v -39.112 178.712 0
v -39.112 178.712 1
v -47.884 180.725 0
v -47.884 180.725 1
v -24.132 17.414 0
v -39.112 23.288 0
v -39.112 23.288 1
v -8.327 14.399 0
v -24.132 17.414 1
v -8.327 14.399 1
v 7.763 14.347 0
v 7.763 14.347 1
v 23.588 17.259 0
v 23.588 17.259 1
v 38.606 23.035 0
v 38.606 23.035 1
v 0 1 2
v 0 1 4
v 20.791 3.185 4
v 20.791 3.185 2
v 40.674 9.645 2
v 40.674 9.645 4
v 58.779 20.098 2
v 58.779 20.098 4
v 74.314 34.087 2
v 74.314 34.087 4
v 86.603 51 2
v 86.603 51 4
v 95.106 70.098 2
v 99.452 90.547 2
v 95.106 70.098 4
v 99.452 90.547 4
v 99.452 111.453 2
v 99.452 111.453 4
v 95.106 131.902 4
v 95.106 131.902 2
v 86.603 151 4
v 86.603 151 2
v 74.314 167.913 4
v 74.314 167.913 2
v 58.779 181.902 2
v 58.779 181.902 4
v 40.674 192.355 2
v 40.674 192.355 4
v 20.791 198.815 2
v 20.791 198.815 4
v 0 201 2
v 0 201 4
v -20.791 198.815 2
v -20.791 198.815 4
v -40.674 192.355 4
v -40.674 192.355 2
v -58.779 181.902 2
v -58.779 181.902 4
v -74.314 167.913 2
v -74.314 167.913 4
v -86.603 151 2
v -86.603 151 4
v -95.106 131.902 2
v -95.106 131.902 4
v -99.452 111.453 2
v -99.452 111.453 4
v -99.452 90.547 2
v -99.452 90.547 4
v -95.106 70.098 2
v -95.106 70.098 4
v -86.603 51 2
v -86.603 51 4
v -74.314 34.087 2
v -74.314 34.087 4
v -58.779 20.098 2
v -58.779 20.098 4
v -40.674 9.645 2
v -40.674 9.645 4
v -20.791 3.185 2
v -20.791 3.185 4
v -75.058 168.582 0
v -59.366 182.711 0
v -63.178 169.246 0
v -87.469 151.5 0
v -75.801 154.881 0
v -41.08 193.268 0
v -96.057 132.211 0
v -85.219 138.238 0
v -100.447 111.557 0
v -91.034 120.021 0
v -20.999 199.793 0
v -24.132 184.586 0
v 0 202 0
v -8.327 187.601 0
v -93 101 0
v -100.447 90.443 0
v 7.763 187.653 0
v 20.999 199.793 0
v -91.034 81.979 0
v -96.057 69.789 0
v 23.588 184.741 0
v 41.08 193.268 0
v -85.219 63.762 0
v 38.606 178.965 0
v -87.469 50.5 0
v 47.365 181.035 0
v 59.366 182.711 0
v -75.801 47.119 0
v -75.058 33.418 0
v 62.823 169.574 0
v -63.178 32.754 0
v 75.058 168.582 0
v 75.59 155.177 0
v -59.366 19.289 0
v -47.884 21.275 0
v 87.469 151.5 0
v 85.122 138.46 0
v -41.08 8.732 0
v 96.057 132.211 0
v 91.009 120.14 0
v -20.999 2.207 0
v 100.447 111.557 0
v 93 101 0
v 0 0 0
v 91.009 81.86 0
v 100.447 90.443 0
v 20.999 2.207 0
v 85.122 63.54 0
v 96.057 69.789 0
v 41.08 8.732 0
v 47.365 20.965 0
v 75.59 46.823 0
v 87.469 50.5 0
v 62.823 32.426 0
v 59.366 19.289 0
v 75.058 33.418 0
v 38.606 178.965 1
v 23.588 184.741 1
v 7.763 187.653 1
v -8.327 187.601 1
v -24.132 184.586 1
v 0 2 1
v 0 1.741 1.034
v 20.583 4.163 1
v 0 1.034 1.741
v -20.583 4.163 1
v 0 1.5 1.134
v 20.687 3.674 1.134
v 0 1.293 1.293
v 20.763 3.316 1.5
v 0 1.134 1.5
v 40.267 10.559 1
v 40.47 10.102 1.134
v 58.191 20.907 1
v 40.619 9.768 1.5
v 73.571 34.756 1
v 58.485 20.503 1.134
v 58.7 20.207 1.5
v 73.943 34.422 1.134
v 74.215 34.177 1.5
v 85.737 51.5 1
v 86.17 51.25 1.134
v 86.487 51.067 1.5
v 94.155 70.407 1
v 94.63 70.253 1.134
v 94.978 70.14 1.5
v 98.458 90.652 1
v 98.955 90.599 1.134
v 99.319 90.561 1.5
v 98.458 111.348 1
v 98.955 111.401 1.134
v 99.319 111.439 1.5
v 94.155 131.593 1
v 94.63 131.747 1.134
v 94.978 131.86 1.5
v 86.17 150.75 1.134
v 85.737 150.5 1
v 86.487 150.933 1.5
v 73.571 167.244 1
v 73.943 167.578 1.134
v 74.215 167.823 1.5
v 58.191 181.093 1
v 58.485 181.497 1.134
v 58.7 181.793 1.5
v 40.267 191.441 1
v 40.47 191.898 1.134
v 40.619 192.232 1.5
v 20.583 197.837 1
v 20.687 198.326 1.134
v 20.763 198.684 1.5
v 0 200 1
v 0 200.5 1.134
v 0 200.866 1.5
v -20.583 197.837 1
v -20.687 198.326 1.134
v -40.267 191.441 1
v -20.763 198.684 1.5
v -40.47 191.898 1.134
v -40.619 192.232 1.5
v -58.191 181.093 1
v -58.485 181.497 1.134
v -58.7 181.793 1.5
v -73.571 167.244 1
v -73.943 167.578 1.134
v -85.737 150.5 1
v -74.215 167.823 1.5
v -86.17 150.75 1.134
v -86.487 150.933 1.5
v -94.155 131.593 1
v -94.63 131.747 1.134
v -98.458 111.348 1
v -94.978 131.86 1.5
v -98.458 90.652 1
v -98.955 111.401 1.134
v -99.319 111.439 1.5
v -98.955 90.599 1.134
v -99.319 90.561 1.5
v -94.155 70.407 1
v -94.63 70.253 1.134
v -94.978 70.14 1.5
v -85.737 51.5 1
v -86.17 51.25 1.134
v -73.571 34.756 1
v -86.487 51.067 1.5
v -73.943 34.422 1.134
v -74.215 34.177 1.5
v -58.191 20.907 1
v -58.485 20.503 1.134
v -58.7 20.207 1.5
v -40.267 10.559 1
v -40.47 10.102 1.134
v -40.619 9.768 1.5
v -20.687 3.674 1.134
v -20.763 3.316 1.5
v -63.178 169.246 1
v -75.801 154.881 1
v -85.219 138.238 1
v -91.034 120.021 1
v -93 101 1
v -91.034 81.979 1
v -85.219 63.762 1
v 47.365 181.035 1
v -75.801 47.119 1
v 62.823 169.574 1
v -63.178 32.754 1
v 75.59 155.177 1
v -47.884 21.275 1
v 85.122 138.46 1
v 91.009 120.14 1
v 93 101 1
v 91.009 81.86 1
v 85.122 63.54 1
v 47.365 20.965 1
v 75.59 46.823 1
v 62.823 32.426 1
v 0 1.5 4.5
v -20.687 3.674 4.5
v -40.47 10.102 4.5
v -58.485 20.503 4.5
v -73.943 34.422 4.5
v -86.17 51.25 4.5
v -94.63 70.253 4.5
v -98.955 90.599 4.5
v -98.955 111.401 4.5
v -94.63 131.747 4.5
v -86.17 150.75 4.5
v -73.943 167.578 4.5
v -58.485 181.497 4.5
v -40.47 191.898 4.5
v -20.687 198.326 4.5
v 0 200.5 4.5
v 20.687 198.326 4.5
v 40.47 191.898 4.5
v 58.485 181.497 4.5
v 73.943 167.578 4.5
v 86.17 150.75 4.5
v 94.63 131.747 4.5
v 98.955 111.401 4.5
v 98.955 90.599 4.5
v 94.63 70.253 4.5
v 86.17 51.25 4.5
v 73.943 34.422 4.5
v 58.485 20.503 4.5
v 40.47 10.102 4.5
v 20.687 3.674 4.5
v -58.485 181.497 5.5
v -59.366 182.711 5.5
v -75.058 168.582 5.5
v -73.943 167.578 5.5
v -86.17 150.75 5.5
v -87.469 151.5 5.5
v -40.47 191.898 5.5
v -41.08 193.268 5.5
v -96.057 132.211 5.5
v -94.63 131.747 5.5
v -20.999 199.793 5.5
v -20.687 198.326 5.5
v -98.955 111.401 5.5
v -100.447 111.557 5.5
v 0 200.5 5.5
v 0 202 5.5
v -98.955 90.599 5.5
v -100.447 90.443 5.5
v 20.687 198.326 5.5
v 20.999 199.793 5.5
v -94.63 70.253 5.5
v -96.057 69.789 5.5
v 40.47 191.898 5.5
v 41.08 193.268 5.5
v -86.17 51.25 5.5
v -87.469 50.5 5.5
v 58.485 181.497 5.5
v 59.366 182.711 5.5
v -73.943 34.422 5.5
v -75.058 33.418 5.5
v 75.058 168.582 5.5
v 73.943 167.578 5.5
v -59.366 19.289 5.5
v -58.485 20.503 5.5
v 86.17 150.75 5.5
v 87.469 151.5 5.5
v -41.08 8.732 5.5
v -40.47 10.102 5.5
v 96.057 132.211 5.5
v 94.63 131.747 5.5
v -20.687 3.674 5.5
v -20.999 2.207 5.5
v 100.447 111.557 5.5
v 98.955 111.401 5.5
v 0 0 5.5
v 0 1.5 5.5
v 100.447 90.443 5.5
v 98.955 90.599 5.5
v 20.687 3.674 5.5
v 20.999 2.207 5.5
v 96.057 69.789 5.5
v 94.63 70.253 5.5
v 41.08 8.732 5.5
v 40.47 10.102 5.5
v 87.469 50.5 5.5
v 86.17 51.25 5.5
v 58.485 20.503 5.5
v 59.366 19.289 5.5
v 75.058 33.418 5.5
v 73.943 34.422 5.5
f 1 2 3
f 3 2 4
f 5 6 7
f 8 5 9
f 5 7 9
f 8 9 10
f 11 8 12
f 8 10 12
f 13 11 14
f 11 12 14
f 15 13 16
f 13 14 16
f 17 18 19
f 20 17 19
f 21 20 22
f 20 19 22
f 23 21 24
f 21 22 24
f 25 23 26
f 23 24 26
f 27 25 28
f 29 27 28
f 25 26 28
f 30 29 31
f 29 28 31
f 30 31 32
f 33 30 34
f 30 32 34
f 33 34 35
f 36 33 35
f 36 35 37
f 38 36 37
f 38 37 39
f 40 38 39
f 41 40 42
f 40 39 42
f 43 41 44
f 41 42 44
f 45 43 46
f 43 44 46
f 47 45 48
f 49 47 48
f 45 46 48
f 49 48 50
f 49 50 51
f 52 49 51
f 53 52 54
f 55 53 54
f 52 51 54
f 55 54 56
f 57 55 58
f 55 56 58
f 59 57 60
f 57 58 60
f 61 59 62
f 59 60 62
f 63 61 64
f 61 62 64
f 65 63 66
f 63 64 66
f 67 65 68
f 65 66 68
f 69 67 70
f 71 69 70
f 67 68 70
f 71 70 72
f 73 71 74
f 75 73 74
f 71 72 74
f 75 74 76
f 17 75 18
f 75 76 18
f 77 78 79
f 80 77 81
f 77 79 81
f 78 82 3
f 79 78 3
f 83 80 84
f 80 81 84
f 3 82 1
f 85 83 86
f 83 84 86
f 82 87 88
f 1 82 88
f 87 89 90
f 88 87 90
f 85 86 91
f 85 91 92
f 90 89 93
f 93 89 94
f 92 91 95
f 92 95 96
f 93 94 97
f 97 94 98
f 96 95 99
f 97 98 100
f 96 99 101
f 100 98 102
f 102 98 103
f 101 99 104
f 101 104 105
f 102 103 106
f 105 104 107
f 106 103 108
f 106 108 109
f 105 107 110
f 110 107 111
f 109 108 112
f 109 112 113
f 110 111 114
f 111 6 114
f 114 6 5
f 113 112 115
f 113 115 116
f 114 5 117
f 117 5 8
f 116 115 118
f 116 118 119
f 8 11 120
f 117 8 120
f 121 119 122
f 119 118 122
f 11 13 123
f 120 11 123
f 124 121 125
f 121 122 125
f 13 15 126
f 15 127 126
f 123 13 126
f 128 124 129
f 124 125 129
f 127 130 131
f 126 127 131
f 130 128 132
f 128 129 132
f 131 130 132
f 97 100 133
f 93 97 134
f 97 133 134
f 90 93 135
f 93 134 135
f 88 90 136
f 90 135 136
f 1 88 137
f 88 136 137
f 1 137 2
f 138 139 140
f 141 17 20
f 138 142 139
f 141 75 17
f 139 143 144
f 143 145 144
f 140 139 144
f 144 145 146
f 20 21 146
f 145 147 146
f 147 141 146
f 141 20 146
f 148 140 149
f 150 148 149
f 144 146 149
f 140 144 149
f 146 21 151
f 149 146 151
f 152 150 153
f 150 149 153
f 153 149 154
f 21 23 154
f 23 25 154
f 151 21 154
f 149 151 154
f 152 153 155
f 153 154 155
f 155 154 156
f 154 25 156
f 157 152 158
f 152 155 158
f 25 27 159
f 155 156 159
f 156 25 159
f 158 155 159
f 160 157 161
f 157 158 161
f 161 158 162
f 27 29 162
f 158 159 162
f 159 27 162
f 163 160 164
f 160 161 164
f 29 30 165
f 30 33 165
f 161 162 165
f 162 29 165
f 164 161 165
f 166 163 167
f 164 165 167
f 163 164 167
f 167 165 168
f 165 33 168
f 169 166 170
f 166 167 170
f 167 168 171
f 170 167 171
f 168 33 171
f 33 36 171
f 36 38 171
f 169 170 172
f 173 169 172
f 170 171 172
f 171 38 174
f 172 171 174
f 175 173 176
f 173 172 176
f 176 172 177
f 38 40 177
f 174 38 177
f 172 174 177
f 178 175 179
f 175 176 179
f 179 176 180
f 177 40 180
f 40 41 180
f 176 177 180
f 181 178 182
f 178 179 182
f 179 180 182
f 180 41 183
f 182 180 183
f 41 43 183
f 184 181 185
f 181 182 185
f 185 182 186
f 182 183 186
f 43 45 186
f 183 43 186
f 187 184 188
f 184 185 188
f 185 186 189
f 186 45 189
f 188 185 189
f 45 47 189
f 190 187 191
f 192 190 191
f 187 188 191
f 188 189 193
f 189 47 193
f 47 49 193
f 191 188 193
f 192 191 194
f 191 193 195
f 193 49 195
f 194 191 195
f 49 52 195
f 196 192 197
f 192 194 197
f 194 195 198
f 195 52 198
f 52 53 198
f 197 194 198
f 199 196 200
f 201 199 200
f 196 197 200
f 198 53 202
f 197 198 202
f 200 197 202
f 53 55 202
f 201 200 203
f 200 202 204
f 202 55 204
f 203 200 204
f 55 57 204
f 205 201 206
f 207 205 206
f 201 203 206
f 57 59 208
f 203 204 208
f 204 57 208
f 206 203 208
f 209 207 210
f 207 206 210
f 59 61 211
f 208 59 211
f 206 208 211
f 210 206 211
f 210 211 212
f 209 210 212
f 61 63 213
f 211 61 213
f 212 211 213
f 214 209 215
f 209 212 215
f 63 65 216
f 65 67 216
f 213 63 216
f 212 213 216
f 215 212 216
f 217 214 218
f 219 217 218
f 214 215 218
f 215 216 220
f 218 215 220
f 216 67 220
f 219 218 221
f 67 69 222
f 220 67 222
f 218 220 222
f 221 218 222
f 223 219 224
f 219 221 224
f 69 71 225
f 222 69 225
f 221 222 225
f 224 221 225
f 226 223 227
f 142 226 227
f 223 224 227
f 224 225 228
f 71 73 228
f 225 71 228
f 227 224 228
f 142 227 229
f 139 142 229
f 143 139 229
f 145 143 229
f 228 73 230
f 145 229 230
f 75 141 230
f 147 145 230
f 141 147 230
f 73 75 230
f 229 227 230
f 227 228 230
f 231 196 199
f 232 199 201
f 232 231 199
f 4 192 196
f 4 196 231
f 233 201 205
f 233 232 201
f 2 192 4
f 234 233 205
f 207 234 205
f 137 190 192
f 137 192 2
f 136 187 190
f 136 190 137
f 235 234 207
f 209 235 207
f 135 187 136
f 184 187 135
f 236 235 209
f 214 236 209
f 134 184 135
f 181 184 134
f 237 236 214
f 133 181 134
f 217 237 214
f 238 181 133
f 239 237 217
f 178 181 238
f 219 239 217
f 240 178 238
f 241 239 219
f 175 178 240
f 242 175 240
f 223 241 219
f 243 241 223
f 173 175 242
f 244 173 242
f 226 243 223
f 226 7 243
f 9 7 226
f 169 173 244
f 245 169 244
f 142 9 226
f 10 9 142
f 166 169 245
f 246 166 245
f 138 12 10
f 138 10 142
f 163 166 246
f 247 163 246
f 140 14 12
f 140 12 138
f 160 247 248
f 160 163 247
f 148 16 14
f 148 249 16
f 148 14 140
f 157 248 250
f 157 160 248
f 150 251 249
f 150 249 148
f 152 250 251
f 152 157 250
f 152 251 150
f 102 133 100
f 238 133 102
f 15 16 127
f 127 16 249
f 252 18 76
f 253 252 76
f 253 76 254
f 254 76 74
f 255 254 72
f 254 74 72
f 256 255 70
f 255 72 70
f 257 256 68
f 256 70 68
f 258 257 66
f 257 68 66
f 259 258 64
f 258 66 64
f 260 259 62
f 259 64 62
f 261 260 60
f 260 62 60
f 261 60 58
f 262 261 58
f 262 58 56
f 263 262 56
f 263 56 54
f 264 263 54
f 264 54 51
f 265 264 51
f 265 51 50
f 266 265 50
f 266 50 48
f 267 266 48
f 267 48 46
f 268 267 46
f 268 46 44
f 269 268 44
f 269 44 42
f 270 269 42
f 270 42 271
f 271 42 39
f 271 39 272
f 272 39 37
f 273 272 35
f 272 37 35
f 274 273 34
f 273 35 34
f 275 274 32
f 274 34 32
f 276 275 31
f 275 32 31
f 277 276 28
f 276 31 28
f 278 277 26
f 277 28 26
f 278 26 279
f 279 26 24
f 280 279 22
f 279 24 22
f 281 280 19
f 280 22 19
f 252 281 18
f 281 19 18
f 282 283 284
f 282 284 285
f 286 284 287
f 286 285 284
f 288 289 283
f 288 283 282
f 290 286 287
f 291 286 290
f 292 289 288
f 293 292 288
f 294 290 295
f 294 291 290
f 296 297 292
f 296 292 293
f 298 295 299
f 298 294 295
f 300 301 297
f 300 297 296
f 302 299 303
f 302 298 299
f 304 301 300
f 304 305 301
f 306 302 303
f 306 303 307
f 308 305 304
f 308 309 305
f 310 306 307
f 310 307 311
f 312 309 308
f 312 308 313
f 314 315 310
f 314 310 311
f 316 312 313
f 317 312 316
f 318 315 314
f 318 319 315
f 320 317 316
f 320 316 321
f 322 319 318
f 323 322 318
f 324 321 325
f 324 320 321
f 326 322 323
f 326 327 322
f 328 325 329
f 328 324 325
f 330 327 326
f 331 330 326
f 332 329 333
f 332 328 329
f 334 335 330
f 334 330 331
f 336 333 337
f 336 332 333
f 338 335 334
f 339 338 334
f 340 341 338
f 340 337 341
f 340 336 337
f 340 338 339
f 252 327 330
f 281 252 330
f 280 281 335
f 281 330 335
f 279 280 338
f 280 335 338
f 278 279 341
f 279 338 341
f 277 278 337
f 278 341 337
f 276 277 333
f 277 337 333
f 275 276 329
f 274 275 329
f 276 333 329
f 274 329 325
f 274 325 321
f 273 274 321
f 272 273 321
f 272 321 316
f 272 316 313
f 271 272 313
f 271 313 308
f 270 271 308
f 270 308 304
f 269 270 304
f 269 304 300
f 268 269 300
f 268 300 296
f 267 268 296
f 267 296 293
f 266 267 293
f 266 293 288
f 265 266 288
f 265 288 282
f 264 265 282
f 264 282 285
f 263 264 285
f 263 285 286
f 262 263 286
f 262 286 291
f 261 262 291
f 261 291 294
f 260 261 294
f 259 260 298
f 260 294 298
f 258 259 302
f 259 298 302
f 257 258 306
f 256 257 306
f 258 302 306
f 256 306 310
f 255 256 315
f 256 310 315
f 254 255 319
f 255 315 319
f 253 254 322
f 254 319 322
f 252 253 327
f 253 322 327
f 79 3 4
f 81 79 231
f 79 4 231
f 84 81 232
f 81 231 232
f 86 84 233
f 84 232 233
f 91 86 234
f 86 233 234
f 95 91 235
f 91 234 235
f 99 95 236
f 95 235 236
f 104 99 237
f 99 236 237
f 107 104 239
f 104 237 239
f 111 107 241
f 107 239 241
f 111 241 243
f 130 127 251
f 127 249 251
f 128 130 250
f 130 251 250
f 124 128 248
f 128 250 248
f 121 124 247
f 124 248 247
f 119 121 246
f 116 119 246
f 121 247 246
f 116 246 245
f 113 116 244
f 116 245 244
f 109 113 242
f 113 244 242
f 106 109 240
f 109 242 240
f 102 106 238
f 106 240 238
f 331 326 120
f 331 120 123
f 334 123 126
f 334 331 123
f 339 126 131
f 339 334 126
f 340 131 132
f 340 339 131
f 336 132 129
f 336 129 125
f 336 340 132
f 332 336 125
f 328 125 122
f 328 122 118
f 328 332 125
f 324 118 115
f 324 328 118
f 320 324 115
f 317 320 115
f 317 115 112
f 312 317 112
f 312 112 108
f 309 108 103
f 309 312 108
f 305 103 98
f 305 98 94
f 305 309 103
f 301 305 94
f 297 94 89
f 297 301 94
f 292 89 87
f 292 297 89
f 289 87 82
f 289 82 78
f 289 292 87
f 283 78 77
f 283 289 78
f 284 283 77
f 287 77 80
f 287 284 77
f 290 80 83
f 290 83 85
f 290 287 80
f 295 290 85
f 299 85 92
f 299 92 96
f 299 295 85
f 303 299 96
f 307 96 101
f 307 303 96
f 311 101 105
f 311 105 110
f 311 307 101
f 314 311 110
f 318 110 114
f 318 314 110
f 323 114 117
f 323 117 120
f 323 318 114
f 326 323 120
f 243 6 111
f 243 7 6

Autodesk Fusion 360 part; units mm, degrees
sketch "Ring" plane through (0, 0, 0) normal (1, 0, 0) x (0, 1, 0)
  line L0 (0, 0) -> (0, 5.5)
  line L1 (0, 0) -> (14, 0)
  line L2 (14, 0) -> (14, 1)
  line L3 (14, 1) -> (1, 1)
  line L4 (1, 1) -> (1, 4)
  line L5 (1, 4) -> (1.5, 4.5)
  line L6 (1.5, 4.5) -> (1.5, 5.5)
  line L7 (0, 5.5) -> (1.5, 5.5)
  line L8 (101, -11) -> (101, 21) construction
  point P0 (101, 0)
  dimension "d11" = 1
  dimension "d12" = 3
  dimension "d13" = 1
  dimension "d21" = 1
  dimension "d44" = 135
  dimension "d45" = 0.5
  dimension "d47" = 13
  dimension "d48" = 100
revolve "Revolve Ring" add sketch "Ring" angle 360 about axis through (0, 101, -11) along (0, 0, 1)
sketch "Cutout" plane through (0, 0, 1) normal (0, 0, 1) x (-1, 0, 0)
  circle A0 centre (0, -101) radius 100
  circle A1 centre (0, -101) radius 87
  circle A2 centre (0, -101) radius 87
  circle A3 centre (0, -101) radius 93
  line L0 (39.1124, -23.2876) -> (47.8845, -21.275)
  line L1 (-38.6062, -23.0349) -> (-47.365, -20.9653)
  line L2 (-38.6062, -178.9651) -> (-47.365, -181.0347)
  line L3 (39.1124, -178.7124) -> (47.8845, -180.725)
  line L4 (47.8845, -180.725) -> (47.8845, -21.275) construction
  line L5 (-47.365, -181.0347) -> (-47.365, -20.9653) construction
  point P0 (39.1124, -23.2876)
  dimension "d24" = 0
  dimension "d25" = 186
  dimension "d37" = 9
  dimension "d49" = 95.25
  dimension "d50" = 77.719
  dimension "d52" = 159.45
extrude "Remove Cutout" cut sketch "Cutout" against normal blind 10 contours A1 A2 A3 L0 L3 | A1 A2 A3 L1 L2
fillet "Fillet2" radius 1 1 edges at (-93.2327, 64.8385, 1)
equation "d11 = bottom_thickness"
equation "d12 = cardboard_thickness"
equation "d21 = edge_thickness"
equation "d25 = spool_diameter - ( 2 * width_to_holes )"
equation "bottom_thickness = 1 mm" comment "Thickness of the part that touches the spool on the side."
equation "cardboard_thickness = 3 mm" comment "Thickness of the cardboard on the spool."
equation "spool_diameter = 200 mm" comment "Diameter of the spool."
equation "edge_thickness = 1 mm" comment "Thickness of the part that goes around the edge of the cardboard spool and sits on the rollers in the AMS, adding to the diameter of the spool.  Decrease this if the AMS cannot be closed as the diameter is too big.  For example: If the spool diameter is 200 mm and this value is 1 mm, the final diameter of the printed spool ring will be 200 mm + (2 * 1 mm) = 202 mm (as there is material on both sides)."
equation "width_to_holes = 7 mm" comment "Width between the edge of the cardboard spool and right before the holes start (which you use to stick the loose end of the filement in for storage). Decrease this if the printed part covers holes on the cardboard spool."
equation "total_width = 13 mm" comment "Width of the printed part that covers the cardboard spool's side (one side only). Must be larger than or equal to \"width_to_holes\"."
equation "d47 = total_width"
equation "d48 = spool_diameter / 2"
equation "fillet_radius = 1 mm" comment "Size of the internal fillet, to increase strength in case the layers separate when taking it off the bed."
